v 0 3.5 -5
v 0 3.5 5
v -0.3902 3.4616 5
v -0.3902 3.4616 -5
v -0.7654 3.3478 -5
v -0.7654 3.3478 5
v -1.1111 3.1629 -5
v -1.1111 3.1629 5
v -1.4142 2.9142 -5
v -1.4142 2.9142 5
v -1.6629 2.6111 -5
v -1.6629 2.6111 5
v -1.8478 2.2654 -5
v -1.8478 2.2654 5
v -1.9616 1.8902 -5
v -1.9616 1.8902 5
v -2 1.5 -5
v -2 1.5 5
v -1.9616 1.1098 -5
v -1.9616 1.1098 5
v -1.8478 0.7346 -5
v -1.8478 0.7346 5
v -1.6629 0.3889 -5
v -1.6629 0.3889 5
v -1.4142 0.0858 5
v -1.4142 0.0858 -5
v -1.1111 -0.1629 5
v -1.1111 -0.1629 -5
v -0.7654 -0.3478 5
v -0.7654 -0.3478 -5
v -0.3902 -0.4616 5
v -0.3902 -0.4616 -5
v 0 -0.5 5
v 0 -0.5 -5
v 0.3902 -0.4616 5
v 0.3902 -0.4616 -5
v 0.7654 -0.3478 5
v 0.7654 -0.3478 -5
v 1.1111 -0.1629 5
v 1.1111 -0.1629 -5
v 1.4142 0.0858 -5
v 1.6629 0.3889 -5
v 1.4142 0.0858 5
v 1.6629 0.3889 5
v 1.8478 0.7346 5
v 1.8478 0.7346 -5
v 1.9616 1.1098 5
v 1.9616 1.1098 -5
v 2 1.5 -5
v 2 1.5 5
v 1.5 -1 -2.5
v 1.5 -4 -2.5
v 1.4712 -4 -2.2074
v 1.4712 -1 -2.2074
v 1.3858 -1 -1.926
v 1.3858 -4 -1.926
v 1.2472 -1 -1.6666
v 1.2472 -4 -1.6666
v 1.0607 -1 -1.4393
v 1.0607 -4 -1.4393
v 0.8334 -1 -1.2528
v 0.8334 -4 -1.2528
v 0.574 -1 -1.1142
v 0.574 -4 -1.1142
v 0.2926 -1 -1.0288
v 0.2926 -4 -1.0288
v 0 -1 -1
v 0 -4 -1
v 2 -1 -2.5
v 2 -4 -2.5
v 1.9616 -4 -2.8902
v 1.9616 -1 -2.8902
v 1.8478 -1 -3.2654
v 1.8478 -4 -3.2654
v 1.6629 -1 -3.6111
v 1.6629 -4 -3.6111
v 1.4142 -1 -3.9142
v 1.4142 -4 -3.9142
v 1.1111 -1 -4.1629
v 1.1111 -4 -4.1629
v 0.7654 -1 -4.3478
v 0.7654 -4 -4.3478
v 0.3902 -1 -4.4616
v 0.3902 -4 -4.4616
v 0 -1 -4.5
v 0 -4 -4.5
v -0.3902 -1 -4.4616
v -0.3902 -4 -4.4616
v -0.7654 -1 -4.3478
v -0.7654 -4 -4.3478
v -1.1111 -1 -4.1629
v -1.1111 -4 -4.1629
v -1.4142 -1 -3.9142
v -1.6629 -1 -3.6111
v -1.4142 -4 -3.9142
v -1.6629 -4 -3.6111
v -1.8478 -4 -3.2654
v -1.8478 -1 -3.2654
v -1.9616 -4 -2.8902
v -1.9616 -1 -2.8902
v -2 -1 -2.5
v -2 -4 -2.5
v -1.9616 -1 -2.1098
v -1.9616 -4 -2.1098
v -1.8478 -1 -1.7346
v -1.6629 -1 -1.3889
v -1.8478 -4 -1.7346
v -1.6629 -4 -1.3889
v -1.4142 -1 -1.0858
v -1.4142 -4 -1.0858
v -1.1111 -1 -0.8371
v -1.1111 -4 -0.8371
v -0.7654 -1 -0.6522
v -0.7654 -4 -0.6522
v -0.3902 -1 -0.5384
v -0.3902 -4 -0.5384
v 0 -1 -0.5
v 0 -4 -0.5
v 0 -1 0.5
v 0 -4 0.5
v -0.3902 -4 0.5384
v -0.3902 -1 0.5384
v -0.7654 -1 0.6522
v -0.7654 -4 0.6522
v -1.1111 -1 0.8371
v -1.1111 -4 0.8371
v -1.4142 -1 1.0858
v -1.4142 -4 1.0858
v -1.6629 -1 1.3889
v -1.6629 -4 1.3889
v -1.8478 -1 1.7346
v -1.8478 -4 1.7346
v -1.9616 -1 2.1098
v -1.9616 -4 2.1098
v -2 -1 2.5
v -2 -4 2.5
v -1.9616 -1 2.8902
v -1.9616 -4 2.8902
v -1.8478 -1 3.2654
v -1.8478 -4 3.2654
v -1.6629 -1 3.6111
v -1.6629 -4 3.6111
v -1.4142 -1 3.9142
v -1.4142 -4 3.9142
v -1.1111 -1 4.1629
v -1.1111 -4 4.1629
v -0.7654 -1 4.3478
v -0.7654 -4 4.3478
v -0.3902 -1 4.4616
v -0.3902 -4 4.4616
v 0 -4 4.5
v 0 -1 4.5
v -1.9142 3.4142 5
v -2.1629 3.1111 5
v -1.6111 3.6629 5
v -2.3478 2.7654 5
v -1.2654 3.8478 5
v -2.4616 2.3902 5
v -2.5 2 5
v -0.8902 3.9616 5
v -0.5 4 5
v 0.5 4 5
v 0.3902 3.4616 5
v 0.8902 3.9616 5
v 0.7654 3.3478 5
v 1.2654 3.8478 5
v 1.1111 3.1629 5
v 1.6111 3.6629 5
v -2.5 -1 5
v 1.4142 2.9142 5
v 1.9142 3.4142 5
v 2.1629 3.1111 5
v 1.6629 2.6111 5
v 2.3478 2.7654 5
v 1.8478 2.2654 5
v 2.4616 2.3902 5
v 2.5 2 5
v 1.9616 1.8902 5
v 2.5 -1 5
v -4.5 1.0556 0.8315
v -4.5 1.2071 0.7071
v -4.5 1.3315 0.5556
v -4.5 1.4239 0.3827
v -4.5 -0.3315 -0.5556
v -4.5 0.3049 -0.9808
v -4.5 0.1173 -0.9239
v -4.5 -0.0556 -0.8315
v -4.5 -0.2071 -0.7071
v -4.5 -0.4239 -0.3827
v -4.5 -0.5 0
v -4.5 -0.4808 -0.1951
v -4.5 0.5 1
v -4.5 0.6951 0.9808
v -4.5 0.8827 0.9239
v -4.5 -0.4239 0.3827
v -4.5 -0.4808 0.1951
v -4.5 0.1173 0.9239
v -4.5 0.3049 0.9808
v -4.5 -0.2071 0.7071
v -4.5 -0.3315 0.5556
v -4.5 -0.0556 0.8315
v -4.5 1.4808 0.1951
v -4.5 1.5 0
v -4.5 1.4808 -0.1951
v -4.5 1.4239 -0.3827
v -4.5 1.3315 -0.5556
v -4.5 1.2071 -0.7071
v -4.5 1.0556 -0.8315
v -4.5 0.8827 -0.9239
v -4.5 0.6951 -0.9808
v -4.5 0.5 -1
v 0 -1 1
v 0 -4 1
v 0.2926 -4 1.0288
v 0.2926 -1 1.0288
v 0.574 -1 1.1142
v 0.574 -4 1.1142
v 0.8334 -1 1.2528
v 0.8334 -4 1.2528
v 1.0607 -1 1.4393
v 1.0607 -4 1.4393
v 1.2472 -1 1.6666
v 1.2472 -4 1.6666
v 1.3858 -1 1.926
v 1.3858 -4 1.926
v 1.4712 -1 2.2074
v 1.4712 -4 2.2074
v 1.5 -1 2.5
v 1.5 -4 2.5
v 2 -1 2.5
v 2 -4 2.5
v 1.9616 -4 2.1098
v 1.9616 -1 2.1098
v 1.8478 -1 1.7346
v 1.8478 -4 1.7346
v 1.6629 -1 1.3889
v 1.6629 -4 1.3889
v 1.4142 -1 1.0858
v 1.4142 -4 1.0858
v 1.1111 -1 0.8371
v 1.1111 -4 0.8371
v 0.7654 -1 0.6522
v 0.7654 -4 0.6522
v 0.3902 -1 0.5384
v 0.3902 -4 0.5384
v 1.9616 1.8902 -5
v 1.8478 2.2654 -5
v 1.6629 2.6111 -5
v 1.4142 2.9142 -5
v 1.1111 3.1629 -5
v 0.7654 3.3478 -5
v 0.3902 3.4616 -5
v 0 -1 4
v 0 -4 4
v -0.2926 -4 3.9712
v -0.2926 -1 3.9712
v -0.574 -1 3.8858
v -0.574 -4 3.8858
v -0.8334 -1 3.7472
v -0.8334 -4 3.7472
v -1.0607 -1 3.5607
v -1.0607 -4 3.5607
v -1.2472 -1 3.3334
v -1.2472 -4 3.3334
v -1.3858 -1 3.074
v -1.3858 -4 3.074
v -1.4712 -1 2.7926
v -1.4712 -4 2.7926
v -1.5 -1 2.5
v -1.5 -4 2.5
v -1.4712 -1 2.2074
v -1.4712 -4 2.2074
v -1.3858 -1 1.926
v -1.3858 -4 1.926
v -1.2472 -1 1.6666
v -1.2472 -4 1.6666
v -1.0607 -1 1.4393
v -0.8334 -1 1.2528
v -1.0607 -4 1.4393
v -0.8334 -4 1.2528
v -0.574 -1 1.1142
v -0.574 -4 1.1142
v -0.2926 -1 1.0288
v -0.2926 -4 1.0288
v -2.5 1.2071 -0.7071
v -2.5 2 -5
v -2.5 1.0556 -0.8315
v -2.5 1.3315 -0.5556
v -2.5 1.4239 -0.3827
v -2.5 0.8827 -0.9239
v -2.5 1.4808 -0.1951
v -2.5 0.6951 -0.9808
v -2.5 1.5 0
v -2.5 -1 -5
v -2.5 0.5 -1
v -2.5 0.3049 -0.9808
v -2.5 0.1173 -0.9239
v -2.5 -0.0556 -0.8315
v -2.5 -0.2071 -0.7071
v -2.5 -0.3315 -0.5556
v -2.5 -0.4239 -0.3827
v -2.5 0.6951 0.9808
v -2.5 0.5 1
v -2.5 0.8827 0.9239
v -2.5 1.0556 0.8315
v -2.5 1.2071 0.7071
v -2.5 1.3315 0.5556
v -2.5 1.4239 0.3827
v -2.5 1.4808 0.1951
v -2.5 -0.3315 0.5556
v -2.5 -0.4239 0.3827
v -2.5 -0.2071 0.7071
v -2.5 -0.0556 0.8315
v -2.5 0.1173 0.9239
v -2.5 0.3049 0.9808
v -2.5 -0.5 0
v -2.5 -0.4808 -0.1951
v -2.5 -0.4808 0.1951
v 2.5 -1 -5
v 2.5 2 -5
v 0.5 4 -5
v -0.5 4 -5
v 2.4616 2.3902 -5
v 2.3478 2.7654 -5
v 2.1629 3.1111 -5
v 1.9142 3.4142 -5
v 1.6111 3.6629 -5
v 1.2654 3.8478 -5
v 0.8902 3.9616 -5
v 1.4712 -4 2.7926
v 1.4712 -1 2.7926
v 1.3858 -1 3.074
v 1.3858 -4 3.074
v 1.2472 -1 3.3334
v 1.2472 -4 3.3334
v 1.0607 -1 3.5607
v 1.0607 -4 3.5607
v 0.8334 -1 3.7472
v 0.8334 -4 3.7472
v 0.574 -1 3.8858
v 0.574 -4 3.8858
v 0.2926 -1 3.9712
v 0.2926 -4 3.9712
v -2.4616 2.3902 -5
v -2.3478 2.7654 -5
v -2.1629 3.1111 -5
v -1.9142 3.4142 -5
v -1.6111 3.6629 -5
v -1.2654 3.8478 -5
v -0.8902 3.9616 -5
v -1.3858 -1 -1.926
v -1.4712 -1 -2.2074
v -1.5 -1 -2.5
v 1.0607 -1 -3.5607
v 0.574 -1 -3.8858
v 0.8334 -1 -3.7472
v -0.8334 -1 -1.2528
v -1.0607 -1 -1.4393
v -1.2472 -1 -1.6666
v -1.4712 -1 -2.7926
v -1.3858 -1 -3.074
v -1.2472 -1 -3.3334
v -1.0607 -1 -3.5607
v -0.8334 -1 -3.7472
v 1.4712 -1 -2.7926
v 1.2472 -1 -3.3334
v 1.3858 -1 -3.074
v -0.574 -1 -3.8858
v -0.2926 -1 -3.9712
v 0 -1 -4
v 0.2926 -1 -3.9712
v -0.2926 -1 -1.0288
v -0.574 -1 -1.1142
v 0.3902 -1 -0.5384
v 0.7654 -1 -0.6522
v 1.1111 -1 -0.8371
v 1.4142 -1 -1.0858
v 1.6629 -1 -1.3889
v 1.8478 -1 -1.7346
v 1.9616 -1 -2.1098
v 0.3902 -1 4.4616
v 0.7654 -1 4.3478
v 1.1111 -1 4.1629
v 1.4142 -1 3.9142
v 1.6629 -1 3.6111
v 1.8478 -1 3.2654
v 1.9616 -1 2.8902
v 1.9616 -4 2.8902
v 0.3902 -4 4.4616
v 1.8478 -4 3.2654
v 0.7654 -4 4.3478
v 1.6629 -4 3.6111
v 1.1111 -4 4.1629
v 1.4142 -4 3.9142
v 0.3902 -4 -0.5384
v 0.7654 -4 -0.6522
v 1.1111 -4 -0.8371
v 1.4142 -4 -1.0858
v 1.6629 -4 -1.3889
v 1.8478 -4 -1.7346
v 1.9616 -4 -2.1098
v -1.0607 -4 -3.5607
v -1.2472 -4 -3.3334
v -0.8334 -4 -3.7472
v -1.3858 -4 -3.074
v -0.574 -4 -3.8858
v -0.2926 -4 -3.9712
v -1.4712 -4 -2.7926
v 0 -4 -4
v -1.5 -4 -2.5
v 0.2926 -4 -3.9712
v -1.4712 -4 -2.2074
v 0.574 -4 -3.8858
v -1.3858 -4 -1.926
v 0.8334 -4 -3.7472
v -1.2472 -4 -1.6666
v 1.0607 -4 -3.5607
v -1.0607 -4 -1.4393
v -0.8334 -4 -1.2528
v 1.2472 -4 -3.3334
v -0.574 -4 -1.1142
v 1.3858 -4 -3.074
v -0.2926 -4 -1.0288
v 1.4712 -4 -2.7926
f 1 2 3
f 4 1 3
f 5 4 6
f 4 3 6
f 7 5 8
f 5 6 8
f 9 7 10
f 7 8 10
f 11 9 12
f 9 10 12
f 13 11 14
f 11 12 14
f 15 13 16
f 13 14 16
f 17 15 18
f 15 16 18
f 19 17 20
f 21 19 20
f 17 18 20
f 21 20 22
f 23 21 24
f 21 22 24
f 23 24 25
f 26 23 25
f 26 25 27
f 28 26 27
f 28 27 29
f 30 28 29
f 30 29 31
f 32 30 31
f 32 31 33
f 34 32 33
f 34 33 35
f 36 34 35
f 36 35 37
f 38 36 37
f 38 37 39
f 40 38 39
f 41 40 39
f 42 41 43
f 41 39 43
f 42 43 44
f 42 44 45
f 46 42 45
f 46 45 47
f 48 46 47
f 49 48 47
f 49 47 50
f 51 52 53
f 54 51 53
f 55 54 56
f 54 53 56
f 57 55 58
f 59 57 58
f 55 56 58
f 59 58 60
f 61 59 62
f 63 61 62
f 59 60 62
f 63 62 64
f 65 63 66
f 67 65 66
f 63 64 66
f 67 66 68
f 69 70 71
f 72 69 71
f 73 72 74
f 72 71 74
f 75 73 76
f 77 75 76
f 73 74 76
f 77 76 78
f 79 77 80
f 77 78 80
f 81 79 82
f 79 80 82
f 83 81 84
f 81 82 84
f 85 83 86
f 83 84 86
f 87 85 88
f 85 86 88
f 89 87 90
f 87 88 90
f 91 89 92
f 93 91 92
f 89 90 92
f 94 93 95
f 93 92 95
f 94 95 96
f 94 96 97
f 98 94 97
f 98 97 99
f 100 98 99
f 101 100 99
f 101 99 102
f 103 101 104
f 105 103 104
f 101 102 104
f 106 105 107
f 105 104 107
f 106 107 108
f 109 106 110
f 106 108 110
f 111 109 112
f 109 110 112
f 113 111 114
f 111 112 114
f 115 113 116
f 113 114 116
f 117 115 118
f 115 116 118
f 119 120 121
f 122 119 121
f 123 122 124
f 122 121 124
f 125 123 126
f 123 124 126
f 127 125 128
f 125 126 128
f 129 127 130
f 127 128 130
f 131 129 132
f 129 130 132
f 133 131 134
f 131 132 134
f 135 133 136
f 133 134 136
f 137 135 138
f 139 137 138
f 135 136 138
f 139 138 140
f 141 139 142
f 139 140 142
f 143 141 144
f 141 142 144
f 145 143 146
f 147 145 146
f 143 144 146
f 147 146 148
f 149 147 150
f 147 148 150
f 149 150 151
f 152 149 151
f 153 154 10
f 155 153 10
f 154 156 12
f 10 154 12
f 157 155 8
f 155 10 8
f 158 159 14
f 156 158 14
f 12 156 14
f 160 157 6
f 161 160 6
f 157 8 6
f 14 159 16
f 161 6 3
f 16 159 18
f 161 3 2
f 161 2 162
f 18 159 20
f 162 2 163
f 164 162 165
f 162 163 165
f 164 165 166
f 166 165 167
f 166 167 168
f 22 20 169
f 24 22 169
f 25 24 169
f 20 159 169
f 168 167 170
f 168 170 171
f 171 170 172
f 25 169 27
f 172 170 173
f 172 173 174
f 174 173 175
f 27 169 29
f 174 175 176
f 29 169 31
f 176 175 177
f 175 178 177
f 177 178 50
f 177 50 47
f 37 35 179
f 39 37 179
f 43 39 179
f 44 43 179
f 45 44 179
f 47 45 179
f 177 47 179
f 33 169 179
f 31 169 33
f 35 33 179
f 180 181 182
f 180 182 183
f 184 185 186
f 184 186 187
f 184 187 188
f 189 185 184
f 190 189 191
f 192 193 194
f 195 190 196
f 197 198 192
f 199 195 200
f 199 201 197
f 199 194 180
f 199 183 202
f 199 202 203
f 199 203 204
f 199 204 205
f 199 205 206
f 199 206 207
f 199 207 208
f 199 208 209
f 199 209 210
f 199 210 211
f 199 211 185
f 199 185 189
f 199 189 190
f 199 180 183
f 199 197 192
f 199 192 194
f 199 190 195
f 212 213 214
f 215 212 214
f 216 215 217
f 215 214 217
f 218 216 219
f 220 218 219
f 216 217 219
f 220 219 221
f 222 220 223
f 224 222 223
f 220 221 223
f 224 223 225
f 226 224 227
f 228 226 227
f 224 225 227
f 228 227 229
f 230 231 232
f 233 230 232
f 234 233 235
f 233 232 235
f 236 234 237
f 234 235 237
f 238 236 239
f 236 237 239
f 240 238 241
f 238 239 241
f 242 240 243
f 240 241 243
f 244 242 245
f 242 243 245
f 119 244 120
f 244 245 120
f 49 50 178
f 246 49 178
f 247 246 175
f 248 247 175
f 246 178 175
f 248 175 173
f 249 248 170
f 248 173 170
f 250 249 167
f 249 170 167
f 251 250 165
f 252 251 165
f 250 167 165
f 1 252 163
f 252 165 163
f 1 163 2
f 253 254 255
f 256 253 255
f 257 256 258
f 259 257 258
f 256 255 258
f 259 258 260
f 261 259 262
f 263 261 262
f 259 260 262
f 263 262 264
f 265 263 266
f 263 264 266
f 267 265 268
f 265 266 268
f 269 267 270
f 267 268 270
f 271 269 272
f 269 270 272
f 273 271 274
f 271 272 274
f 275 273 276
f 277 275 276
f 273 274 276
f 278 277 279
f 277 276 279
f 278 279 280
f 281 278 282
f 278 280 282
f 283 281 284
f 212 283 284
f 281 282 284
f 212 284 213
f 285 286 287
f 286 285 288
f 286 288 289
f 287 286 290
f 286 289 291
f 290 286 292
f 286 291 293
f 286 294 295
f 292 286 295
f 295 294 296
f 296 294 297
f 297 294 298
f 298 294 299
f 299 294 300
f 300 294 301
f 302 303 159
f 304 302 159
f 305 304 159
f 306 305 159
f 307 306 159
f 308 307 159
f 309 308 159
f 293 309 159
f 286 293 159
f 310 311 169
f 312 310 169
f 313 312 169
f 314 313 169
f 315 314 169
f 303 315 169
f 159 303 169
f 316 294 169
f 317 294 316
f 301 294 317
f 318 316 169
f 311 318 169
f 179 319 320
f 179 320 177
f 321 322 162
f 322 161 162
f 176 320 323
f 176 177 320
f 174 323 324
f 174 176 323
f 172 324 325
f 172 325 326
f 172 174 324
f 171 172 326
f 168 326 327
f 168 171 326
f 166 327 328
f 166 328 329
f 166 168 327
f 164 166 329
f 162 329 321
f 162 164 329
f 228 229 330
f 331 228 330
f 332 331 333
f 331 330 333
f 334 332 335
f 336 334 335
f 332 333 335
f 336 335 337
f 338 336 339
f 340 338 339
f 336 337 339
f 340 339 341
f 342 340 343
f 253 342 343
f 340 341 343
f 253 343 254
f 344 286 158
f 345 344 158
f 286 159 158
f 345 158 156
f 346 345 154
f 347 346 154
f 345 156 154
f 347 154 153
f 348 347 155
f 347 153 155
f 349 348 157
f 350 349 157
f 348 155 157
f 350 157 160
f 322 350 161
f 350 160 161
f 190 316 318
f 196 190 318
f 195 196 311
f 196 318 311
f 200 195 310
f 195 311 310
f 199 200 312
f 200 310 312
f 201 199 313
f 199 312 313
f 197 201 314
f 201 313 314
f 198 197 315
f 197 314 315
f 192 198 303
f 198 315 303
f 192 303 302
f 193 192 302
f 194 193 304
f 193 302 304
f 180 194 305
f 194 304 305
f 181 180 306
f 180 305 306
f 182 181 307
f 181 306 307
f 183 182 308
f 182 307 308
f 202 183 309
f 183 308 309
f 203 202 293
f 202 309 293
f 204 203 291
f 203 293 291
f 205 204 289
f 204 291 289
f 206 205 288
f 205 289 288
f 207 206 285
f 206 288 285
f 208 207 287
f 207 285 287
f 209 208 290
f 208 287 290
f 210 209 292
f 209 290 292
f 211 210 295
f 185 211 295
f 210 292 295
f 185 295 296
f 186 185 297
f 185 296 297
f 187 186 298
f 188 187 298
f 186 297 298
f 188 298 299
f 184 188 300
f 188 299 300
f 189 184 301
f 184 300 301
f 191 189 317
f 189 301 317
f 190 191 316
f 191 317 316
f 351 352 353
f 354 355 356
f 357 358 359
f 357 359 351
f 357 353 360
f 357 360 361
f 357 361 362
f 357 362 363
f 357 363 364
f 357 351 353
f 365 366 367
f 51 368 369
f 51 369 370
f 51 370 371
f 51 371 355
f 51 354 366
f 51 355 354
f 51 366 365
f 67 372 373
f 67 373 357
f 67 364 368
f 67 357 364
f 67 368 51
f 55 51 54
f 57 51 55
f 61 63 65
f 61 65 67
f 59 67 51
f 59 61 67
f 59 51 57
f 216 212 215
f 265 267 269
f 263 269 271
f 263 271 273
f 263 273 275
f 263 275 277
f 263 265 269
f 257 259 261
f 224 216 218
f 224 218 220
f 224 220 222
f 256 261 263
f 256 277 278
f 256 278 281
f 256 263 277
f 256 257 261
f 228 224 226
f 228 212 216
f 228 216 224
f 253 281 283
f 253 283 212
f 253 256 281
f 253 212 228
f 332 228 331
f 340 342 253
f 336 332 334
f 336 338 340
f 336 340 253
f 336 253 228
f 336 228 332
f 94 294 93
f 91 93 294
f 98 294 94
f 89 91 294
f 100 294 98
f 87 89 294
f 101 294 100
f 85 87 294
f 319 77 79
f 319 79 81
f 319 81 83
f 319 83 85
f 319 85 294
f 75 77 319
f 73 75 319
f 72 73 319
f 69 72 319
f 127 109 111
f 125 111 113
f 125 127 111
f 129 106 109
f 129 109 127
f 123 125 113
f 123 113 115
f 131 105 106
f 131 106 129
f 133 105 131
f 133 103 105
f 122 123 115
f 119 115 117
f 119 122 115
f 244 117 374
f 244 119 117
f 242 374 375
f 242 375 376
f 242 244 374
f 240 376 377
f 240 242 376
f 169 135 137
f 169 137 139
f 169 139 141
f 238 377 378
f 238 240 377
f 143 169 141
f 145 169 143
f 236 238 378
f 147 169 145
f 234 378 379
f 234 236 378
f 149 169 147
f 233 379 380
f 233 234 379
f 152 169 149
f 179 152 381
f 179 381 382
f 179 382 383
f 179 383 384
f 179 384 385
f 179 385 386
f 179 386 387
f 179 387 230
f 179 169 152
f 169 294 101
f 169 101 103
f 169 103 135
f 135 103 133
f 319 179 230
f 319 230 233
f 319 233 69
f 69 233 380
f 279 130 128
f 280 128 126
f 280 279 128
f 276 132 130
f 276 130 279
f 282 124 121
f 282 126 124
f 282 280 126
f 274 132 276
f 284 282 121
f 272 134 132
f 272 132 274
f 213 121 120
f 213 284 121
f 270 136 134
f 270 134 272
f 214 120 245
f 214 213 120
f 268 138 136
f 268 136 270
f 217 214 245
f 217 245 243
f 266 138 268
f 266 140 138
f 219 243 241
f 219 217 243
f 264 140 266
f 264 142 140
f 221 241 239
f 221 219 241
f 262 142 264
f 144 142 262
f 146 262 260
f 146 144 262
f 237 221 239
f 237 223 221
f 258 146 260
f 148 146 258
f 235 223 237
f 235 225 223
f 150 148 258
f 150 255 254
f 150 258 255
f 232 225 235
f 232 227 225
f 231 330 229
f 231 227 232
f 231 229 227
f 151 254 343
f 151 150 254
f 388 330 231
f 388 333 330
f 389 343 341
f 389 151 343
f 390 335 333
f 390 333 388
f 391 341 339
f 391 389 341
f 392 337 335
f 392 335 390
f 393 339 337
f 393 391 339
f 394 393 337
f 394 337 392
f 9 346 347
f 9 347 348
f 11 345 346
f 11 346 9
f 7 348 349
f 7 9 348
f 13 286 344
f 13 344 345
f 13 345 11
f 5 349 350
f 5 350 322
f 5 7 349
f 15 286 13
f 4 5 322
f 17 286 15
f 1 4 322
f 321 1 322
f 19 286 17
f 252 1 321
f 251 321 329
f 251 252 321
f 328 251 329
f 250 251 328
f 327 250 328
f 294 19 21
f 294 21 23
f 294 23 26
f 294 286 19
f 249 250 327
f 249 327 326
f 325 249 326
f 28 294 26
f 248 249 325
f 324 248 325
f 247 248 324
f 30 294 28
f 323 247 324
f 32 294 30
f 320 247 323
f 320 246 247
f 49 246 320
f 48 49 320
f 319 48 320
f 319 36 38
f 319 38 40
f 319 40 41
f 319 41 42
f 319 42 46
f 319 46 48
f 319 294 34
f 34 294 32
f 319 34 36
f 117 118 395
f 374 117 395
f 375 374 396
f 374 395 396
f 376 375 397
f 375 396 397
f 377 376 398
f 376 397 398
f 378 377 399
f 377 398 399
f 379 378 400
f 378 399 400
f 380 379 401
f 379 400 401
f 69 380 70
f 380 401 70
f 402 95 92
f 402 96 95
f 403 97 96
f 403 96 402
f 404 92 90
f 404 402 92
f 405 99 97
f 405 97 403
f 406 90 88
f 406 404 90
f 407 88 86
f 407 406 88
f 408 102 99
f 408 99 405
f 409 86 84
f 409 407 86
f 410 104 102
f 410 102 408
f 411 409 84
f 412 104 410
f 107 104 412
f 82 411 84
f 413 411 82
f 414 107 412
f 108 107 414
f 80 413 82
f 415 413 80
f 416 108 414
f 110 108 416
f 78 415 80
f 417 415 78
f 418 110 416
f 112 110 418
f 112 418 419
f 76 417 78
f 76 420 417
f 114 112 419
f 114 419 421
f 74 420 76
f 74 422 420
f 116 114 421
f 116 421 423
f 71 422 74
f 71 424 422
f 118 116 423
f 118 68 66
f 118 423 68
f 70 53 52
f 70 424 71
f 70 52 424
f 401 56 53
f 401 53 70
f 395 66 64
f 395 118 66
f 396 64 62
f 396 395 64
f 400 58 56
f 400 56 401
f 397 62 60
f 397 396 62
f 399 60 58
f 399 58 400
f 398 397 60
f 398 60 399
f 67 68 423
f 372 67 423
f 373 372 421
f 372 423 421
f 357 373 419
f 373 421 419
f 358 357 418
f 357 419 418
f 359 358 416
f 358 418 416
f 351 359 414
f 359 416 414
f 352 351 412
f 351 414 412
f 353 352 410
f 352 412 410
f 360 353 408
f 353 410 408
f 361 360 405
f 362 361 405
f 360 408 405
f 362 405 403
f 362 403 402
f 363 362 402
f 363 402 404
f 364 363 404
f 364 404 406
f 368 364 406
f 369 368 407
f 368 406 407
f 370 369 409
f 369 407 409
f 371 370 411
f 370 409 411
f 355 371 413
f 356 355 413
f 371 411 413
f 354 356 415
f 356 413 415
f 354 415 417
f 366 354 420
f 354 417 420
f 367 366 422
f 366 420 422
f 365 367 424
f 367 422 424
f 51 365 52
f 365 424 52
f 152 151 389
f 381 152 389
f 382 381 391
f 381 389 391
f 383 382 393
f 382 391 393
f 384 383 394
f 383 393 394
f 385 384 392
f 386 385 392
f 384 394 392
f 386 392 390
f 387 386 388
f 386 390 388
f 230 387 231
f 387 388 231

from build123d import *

# Parameters (mm, degrees)
F0_W      = 5
F0_H      = 10
F1_DEPTH  = 4
F2_W      = 2
F2_H      = 4
F3_DEPTH  = 25
F4_R      = 2
F7_DEPTH  = 3
F8_DEPTH  = 25
F9_R      = 1
F10_DEPTH = 2


# Not quite as in the source:
# - a feature names something its author has since deleted; it is built from what else it names


with BuildPart() as f1:
    # F0 (on Front) → F1 (new body, symmetric)
    with BuildSketch(Plane.XZ):
        Rectangle(F0_W, F0_H)
    extrude(amount=F1_DEPTH, both=True)

    # F2 (on face) → F3 (cut)
    with BuildSketch(Plane.XZ.offset(4)):
        with Locations((3.5, 3)):
            Rectangle(F2_W, F2_H)
        with Locations((10.5, 3)):
            Rectangle(F2_W, F2_H)
        with Locations((17.5, 3)):
            Rectangle(F2_W, F2_H)
        with Locations((17.5, -3)):
            Rectangle(F2_W, F2_H)
        with Locations((10.5, -3)):
            Rectangle(F2_W, F2_H)
        with Locations((3.5, -3)):
            Rectangle(F2_W, F2_H)
    extrude(amount=-F3_DEPTH, mode=Mode.SUBTRACT)

    # F4
    f4_edges = [f1.edges().sort_by_distance(p)[0] for p in [
        (-2.5, 4, 0),
        (2.5, 4, 0),
    ]]
    fillet(f4_edges, radius=F4_R)

    # F6 (on face) → F7 (cut)
    with BuildSketch(Plane.XZ.offset(4)):
        Polygon((2.5, 5), (0, 5), (-2.5, 5), (-2.5, -5), (2.5, -5), align=None)
        with BuildLine():
            ThreePointArc((2, -2.5), (-1.4142135624, -3.9142135624), (0, -0.5))
            ThreePointArc((0, -0.5), (1.4142135624, -1.0857864376), (2, -2.5))
        make_face(mode=Mode.SUBTRACT)
        with BuildLine():
            ThreePointArc((0, 0.5), (-2, 2.5), (0, 4.5))
            ThreePointArc((0, 4.5), (1.4142135624, 3.9142135624), (2, 2.5))
            ThreePointArc((2, 2.5), (1.4142135624, 1.0857864376), (0, 0.5))
        make_face(mode=Mode.SUBTRACT)
        with BuildLine():
            ThreePointArc((1.5, -2.5), (1.0606601718, -1.4393398282), (0, -1))
            ThreePointArc((0, -1), (-1.0606601718, -3.5606601718), (1.5, -2.5))
        make_face()
        with BuildLine():
            Line((0, 2.5), (0, 4))
            ThreePointArc((0, 4), (-1.5, 2.5), (0, 1))
            Line((0, 1), (0, 2.5))
        make_face()
        with BuildLine():
            ThreePointArc((1.5, 2.5), (1.0606601718, 3.5606601718), (0, 4))
            Line((0, 4), (0, 2.5))
            Line((0, 2.5), (0, 1))
            ThreePointArc((0, 1), (1.0606601718, 1.4393398282), (1.5, 2.5))
        make_face()
    extrude(amount=-F7_DEPTH, mode=Mode.SUBTRACT)

    # F5 (on face) → F8 (cut)
    with BuildSketch(Plane.XY.offset(5)):
        with BuildLine():
            ThreePointArc((2, 1.5), (1.4142135624, 2.9142135624), (0, 3.5))
            ThreePointArc((0, 3.5), (-1.4142135624, 0.0857864376), (2, 1.5))
        make_face()
    extrude(amount=-F8_DEPTH, mode=Mode.SUBTRACT)

    # F9 (on face) → F10 (join)
    with BuildSketch(Plane(origin=(-2.5, 0, 0), x_dir=(0, -1, 0), z_dir=(-1, 0, 0))):
        with Locations((-0.5, 0)):
            Circle(F9_R)
    extrude(amount=F10_DEPTH)


solid = f1.part
